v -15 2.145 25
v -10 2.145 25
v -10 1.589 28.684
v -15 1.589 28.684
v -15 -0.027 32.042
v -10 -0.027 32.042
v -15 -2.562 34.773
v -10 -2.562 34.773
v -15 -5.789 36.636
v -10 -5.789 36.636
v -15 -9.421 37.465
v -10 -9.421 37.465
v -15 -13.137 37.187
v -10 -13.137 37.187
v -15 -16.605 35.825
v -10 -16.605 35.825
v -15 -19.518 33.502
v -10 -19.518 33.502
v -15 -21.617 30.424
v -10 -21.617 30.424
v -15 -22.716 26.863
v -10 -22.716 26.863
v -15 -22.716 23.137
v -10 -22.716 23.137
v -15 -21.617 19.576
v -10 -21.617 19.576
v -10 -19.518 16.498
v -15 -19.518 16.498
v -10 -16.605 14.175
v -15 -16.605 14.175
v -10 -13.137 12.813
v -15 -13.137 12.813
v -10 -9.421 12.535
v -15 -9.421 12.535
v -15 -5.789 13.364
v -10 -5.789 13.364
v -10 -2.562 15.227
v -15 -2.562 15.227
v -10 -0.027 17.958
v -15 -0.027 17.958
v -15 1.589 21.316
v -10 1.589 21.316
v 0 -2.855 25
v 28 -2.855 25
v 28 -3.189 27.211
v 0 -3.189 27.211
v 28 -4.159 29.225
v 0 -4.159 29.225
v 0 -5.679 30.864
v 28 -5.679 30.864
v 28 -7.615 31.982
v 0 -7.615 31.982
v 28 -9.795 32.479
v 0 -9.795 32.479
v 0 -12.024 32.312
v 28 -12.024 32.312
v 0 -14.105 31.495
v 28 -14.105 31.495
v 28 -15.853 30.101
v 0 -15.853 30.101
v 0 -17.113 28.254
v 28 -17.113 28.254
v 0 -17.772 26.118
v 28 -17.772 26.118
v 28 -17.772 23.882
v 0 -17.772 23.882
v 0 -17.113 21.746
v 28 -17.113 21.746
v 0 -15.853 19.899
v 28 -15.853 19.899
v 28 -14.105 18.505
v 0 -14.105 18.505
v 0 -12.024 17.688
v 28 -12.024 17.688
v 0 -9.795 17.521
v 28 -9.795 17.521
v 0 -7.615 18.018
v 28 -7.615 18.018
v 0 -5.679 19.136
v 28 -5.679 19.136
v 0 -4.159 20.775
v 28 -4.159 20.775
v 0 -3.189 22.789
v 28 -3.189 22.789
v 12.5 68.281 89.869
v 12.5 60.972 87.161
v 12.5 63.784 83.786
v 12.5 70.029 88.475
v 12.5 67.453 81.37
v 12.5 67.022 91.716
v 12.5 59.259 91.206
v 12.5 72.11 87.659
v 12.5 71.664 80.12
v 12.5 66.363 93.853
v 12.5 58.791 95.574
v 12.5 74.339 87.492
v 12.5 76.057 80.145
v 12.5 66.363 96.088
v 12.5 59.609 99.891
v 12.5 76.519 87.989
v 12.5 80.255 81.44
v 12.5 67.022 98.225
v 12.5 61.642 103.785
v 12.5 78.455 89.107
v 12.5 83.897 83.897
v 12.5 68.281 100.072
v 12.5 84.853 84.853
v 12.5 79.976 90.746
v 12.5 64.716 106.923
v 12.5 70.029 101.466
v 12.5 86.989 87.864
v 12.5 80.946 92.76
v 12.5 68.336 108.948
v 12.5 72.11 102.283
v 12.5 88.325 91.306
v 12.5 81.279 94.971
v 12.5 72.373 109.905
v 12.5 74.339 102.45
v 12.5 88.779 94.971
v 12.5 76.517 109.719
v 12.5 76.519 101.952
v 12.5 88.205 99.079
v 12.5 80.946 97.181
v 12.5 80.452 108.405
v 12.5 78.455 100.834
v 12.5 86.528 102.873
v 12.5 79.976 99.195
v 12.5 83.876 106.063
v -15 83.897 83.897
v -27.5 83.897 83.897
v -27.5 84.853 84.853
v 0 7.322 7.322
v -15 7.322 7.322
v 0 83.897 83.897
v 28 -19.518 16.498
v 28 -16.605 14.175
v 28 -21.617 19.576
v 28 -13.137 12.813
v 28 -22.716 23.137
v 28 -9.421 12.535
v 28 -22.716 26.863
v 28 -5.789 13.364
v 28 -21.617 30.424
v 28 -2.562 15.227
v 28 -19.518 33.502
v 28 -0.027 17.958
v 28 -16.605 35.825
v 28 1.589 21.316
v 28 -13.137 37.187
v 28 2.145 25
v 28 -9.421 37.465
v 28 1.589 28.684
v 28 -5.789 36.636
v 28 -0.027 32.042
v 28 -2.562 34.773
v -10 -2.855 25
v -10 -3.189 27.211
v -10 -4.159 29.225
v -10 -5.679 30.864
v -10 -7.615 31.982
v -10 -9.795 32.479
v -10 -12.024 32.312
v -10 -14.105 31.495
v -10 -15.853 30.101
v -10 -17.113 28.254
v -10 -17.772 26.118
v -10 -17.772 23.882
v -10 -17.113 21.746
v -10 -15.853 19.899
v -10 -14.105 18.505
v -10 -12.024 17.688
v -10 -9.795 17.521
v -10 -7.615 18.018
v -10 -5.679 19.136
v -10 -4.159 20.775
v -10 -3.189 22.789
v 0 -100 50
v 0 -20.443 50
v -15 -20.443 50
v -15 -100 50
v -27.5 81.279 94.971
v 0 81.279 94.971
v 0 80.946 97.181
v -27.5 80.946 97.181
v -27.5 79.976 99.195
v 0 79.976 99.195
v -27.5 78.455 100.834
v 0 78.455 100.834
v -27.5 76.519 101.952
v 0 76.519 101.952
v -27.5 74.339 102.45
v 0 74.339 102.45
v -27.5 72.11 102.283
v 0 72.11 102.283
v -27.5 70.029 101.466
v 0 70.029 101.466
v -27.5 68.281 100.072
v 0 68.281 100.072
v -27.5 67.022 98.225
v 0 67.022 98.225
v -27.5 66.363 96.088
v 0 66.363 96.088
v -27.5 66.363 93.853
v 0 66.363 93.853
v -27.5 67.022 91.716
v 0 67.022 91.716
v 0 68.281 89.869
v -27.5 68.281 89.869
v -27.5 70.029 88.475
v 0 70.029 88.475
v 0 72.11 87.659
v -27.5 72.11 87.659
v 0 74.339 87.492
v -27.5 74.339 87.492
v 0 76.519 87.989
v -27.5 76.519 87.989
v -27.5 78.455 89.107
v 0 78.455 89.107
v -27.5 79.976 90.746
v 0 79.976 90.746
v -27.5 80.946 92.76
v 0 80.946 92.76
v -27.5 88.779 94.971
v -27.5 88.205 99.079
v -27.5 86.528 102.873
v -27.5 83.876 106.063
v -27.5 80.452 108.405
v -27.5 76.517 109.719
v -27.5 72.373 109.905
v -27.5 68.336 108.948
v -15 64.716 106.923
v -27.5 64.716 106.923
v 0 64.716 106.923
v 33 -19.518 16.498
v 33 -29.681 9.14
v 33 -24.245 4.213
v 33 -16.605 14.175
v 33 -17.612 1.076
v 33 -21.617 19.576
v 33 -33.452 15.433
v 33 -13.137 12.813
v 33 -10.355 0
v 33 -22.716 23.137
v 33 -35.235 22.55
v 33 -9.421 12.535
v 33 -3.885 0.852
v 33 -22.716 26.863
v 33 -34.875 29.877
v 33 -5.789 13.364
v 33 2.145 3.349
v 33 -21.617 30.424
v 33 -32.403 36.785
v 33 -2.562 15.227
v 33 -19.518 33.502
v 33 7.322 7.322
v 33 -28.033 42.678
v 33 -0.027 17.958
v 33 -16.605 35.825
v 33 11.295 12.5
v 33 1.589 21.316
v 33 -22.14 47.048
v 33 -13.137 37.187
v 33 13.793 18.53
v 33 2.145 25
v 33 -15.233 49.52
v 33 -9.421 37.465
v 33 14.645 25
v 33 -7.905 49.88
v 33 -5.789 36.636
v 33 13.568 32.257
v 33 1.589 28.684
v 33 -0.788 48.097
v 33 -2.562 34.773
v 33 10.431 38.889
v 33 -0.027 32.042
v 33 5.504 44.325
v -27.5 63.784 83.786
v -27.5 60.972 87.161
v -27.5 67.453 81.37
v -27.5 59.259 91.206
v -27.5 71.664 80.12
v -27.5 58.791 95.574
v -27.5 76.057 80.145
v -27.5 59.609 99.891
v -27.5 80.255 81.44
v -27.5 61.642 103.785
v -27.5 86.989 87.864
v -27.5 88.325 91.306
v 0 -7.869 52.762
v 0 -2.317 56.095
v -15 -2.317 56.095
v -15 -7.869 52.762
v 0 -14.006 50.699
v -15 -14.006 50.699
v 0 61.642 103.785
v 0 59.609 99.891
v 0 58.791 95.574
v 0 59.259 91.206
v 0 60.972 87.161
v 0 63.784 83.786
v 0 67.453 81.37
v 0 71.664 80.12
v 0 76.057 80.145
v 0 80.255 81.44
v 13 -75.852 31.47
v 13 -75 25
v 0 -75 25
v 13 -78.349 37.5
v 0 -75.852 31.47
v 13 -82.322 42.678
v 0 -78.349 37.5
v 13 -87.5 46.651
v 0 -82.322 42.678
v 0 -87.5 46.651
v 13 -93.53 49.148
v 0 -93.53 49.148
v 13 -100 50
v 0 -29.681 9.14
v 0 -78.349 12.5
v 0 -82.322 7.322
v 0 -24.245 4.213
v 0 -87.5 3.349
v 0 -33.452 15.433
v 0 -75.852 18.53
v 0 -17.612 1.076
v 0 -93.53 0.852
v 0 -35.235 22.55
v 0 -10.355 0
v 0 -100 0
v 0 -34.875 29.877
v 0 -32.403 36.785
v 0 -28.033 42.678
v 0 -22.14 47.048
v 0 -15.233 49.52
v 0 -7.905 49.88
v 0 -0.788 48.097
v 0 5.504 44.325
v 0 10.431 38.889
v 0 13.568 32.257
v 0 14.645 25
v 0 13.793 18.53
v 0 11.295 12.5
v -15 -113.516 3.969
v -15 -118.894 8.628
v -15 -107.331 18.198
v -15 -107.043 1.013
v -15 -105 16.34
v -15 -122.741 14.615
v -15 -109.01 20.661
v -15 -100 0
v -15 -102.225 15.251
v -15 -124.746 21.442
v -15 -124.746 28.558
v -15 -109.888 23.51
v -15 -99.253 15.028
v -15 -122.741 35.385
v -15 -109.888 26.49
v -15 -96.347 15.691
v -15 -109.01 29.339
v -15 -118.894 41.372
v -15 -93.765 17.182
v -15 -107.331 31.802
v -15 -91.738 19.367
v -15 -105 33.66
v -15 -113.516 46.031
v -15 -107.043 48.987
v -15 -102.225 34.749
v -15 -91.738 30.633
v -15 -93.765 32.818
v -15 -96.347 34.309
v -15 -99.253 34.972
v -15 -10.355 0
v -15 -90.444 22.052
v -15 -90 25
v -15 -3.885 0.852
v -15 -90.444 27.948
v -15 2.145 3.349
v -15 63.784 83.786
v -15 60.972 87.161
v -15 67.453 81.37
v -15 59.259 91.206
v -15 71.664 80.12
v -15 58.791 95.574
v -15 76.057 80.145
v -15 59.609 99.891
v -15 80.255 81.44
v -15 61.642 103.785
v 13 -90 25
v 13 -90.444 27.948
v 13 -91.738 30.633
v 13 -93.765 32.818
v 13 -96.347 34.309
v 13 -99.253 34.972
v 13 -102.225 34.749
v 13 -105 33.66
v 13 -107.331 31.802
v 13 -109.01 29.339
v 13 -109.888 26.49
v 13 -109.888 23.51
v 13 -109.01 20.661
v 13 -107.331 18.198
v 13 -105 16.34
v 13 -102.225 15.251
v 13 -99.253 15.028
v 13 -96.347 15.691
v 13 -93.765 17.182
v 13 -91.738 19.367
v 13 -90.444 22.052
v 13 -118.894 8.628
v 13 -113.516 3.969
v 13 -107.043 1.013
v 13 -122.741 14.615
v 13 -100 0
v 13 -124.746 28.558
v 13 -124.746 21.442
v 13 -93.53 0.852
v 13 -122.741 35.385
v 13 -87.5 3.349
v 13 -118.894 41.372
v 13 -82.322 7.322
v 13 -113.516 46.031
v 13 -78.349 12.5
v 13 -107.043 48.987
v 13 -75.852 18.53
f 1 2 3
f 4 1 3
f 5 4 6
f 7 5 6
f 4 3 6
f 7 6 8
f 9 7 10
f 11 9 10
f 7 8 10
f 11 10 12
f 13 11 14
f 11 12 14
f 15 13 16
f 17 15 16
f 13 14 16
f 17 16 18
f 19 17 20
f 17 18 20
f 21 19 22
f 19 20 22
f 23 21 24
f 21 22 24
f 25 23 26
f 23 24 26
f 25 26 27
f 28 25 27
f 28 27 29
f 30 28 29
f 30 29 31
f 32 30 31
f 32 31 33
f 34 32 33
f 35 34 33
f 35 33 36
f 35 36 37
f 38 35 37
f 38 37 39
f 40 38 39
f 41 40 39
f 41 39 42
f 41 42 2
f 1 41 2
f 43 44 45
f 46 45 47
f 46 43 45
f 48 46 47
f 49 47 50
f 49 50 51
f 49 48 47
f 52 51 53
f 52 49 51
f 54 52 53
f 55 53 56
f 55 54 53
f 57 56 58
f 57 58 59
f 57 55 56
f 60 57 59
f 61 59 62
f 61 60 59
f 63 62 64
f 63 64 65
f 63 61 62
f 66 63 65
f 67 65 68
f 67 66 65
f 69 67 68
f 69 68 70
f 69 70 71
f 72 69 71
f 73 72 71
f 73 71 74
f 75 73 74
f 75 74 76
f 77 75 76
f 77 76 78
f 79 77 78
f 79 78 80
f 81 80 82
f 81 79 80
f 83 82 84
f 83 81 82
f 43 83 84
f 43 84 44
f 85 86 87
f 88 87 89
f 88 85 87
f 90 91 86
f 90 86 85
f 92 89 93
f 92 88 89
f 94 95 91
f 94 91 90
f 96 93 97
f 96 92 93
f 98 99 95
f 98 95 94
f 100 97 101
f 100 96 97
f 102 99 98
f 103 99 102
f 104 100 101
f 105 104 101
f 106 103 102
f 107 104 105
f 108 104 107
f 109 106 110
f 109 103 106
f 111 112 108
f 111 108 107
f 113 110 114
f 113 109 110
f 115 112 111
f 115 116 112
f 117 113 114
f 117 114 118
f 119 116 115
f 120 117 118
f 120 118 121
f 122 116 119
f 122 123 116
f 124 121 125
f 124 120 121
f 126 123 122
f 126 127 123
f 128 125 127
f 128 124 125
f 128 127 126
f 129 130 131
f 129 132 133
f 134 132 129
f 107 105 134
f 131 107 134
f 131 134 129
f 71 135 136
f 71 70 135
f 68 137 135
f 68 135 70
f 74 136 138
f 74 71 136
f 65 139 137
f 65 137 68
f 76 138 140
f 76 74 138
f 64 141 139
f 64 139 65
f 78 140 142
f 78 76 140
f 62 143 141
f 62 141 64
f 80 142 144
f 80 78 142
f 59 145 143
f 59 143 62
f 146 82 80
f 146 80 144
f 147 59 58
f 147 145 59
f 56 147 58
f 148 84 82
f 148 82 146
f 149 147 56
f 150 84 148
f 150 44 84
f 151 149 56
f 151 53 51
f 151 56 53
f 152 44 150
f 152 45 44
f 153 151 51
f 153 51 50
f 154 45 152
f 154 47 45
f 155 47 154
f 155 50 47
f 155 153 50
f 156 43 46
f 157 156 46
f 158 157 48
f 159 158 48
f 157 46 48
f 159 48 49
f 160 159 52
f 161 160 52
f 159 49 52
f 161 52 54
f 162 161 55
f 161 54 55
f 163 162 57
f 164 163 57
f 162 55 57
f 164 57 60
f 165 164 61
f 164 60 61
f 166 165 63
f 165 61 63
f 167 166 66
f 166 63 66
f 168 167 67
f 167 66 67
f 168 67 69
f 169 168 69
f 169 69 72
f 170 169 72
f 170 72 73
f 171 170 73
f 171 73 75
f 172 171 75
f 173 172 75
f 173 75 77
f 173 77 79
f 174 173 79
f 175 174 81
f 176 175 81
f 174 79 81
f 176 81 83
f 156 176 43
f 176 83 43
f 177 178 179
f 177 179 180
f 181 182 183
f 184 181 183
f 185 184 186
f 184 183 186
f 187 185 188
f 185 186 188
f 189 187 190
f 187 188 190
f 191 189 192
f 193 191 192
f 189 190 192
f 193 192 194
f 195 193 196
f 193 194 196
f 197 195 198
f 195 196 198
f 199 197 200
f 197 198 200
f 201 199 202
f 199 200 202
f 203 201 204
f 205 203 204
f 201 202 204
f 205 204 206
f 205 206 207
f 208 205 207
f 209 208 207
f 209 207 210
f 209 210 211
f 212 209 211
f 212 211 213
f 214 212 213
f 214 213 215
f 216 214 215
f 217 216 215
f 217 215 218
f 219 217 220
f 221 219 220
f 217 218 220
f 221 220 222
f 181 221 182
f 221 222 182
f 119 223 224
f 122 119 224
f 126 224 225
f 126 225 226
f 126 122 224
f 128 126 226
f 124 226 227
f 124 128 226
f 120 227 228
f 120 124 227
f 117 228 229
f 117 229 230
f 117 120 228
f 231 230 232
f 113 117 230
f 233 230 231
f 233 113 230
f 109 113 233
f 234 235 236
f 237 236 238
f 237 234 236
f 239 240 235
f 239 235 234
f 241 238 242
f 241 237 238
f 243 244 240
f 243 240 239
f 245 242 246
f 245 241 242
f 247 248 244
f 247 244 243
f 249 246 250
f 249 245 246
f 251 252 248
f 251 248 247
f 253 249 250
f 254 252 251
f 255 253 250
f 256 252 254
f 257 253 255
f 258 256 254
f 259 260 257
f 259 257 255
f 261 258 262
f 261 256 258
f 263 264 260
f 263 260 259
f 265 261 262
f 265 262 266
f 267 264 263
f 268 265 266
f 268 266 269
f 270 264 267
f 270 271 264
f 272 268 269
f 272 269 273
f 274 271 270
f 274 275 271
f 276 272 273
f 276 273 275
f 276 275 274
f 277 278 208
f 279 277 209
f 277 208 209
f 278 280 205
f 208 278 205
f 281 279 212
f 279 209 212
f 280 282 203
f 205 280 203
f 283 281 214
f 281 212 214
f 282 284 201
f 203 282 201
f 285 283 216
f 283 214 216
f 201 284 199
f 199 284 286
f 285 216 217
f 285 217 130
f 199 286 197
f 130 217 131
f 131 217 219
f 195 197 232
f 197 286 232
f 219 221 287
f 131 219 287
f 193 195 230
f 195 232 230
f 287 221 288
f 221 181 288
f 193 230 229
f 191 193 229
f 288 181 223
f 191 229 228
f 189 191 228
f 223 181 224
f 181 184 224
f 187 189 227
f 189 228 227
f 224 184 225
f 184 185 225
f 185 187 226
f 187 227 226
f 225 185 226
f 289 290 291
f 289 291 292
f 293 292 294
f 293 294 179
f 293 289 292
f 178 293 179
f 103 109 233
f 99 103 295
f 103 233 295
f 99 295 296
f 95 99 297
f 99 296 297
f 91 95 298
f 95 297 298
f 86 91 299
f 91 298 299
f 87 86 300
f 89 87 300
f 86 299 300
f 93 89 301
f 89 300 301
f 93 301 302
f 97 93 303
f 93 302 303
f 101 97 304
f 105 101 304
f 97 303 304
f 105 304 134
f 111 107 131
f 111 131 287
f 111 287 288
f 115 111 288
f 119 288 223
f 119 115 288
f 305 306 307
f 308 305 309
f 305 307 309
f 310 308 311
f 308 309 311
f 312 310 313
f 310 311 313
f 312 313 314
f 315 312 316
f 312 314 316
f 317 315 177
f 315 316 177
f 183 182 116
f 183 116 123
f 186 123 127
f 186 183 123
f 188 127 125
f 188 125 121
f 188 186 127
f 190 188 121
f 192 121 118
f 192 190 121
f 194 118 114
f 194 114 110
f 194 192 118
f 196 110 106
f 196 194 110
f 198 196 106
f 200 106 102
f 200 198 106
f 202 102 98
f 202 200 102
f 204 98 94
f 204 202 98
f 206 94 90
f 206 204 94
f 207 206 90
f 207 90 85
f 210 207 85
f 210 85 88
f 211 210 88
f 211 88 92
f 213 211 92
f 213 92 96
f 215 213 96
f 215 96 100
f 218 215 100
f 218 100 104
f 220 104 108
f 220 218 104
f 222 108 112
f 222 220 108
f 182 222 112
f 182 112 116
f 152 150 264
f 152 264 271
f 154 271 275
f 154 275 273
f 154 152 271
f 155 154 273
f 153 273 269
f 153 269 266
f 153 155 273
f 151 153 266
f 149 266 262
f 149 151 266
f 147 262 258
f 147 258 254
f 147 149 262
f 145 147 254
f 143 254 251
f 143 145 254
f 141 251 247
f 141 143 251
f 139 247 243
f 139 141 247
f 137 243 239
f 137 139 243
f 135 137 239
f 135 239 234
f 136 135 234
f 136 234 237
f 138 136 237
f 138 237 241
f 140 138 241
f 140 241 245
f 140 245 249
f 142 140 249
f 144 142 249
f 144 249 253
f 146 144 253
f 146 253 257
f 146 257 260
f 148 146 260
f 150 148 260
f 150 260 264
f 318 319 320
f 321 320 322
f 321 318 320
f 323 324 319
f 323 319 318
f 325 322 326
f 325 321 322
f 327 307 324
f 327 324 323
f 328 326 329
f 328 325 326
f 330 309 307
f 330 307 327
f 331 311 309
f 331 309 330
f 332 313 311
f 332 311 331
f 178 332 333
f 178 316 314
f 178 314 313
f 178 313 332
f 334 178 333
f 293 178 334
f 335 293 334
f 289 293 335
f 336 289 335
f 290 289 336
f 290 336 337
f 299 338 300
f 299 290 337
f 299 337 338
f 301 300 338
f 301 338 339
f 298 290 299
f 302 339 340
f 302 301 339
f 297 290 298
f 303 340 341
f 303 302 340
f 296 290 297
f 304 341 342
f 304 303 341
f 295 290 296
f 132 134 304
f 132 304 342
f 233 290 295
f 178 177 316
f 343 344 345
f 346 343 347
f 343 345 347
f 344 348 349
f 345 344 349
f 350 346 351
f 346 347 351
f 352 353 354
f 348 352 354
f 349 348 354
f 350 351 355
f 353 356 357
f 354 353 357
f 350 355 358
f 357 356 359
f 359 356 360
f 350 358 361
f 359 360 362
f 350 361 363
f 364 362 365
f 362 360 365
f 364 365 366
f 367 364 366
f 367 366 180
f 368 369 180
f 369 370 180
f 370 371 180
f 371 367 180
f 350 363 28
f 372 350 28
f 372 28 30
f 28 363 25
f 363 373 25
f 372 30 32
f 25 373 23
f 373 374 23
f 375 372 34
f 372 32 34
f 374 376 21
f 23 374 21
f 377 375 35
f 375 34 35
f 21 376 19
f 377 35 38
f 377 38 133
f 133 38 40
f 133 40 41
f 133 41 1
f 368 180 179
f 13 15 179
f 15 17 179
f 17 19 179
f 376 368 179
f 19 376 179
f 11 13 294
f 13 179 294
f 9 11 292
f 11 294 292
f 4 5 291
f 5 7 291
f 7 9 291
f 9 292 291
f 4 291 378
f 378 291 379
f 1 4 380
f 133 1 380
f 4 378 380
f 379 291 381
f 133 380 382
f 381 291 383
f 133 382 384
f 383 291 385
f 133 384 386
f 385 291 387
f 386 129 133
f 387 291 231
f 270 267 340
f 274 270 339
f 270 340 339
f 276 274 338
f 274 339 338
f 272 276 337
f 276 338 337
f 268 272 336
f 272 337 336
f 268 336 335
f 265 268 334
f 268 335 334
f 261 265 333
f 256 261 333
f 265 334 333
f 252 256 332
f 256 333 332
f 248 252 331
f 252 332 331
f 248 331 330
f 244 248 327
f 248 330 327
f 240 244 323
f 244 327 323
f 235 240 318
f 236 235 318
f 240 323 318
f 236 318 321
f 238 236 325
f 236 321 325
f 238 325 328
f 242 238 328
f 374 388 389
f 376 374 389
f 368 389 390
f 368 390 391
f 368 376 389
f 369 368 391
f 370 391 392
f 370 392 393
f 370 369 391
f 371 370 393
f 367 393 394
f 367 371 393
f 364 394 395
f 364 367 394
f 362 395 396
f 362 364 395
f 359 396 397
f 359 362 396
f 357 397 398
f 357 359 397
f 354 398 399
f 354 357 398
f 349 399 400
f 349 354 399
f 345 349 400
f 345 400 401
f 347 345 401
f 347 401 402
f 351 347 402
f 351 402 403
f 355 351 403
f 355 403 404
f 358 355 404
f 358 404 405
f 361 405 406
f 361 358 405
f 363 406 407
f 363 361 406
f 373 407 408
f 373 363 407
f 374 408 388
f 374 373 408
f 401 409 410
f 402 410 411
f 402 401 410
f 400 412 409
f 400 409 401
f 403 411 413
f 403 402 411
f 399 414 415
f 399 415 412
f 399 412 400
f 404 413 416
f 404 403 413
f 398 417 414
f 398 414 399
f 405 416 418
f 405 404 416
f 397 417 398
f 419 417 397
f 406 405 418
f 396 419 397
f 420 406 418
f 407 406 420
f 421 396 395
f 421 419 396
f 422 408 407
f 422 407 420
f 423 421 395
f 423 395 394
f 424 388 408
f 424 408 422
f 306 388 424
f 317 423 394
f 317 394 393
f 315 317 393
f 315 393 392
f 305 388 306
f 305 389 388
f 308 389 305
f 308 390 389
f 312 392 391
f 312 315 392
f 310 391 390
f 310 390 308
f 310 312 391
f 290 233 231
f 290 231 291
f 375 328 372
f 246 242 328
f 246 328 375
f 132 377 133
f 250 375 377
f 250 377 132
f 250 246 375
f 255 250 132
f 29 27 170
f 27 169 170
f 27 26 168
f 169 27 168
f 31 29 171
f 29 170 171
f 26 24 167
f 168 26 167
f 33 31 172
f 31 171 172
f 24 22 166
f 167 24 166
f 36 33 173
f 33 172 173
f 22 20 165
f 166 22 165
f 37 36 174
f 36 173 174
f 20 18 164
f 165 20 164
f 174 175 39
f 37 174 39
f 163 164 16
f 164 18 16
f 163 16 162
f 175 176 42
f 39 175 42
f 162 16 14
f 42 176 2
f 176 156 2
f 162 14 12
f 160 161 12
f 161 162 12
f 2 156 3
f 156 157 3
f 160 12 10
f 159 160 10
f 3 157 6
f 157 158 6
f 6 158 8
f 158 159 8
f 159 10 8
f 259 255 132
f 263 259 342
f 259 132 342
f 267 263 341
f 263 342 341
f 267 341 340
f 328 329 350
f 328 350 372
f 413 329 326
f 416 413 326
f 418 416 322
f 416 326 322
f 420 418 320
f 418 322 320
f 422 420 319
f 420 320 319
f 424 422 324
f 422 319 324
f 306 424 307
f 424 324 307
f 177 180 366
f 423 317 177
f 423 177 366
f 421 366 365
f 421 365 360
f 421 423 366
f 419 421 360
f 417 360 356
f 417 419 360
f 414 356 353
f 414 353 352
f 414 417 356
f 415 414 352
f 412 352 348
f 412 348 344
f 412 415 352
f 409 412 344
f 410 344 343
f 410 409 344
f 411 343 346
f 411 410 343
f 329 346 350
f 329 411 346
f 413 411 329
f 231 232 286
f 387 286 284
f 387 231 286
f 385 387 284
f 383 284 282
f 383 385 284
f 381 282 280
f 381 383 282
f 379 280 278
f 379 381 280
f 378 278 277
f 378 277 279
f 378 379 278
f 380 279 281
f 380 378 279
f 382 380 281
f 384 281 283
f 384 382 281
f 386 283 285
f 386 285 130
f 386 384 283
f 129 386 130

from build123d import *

# Parameters (mm, degrees)
F1_DEPTH      = 15
F0_R          = 10
F2_DEPTH      = 13
F2_DEPTH_BACK = 15
F0_R_2        = 12.5
F3_DEPTH      = 33
F3_DEPTH_BACK = 15
F0_R_3        = 7.5
F4_DEPTH      = 28
F4_DEPTH_BACK = 10
F5_DEPTH      = 12.5
F5_DEPTH_BACK = 27.5


with BuildPart() as f1:
    # F0 (on Right) → F1 (new body)
    with BuildSketch(Plane.YZ):
        with BuildLine():
            ThreePointArc((-75, 25), (-82.32233, 7.32233), (-100, 0))
            Line((-100, 0), (-10.355339, 0))
            ThreePointArc((-10.355339, 0), (-28.033009, 42.677669), (14.644661, 25))
            ThreePointArc((14.644661, 25), (12.741649, 15.432914), (7.32233, 7.32233))
            Line((7.32233, 7.32233), (83.8967, 83.8967))
            ThreePointArc((83.8967, 83.8967), (62.253682, 85.370134), (64.715921, 106.923061))
            Line((64.715921, 106.923061), (-2.317082, 56.095038))
            ThreePointArc((-2.317082, 56.095038), (-10.881435, 51.564557), (-20.443107, 50))
            Line((-20.443107, 50), (-100, 50))
            ThreePointArc((-100, 50), (-82.32233, 42.67767), (-75, 25))
        make_face()
    extrude(amount=-F1_DEPTH)

    # F0 (on Right) → F2 (join, two sides)
    with BuildSketch(Plane.YZ) as f2_sk:
        with BuildLine():
            ThreePointArc((-100, 50), (-125, 25), (-100, 0))
            ThreePointArc((-100, 0), (-82.32233, 7.32233), (-75, 25))
            ThreePointArc((-75, 25), (-82.32233, 42.67767), (-100, 50))
        make_face()
        with Locations((-100, 25)):
            Circle(F0_R, mode=Mode.SUBTRACT)
    extrude(amount=F2_DEPTH)
    extrude(f2_sk.sketch, amount=-F2_DEPTH_BACK)

    # F0 (on Right) → F3 (join, two sides)
    with BuildSketch(Plane.YZ) as f3_sk:
        with BuildLine():
            ThreePointArc((14.644661, 25), (-28.033009, 42.677669), (-10.355339, 0))
            ThreePointArc((-10.355339, 0), (-0.788253, 1.903012), (7.32233, 7.32233))
            ThreePointArc((7.32233, 7.32233), (12.741649, 15.432914), (14.644661, 25))
        make_face()
        with Locations((-10.355339, 25)):
            Circle(F0_R_2, mode=Mode.SUBTRACT)
    extrude(amount=F3_DEPTH)
    extrude(f3_sk.sketch, amount=-F3_DEPTH_BACK)

    # F0 (on Right) → F4 (join, two sides)
    with BuildSketch(Plane.YZ) as f4_sk:
        with Locations((-10.355339, 25)):
            Circle(F0_R_2)
        with Locations((-10.355339, 25)):
            Circle(F0_R_3, mode=Mode.SUBTRACT)
    extrude(amount=F4_DEPTH)
    extrude(f4_sk.sketch, amount=-F4_DEPTH_BACK)

    # F0 (on Right) → F5 (join, two sides)
    with BuildSketch(Plane.YZ) as f5_sk:
        with BuildLine():
            ThreePointArc((64.715921, 106.923061), (62.253682, 85.370134), (83.8967, 83.8967))
            Line((83.8967, 83.8967), (84.852814, 84.852814))
            ThreePointArc((84.852814, 84.852814), (87.763, 89.544172), (88.778934, 94.97058))
            ThreePointArc((88.778934, 94.97058), (80.45182, 108.404589), (64.715921, 106.923061))
        make_face()
        with Locations((73.778934, 94.97058)):
            Circle(F0_R_3, mode=Mode.SUBTRACT)
    extrude(amount=F5_DEPTH)
    extrude(f5_sk.sketch, amount=-F5_DEPTH_BACK)


solid = f1.part
